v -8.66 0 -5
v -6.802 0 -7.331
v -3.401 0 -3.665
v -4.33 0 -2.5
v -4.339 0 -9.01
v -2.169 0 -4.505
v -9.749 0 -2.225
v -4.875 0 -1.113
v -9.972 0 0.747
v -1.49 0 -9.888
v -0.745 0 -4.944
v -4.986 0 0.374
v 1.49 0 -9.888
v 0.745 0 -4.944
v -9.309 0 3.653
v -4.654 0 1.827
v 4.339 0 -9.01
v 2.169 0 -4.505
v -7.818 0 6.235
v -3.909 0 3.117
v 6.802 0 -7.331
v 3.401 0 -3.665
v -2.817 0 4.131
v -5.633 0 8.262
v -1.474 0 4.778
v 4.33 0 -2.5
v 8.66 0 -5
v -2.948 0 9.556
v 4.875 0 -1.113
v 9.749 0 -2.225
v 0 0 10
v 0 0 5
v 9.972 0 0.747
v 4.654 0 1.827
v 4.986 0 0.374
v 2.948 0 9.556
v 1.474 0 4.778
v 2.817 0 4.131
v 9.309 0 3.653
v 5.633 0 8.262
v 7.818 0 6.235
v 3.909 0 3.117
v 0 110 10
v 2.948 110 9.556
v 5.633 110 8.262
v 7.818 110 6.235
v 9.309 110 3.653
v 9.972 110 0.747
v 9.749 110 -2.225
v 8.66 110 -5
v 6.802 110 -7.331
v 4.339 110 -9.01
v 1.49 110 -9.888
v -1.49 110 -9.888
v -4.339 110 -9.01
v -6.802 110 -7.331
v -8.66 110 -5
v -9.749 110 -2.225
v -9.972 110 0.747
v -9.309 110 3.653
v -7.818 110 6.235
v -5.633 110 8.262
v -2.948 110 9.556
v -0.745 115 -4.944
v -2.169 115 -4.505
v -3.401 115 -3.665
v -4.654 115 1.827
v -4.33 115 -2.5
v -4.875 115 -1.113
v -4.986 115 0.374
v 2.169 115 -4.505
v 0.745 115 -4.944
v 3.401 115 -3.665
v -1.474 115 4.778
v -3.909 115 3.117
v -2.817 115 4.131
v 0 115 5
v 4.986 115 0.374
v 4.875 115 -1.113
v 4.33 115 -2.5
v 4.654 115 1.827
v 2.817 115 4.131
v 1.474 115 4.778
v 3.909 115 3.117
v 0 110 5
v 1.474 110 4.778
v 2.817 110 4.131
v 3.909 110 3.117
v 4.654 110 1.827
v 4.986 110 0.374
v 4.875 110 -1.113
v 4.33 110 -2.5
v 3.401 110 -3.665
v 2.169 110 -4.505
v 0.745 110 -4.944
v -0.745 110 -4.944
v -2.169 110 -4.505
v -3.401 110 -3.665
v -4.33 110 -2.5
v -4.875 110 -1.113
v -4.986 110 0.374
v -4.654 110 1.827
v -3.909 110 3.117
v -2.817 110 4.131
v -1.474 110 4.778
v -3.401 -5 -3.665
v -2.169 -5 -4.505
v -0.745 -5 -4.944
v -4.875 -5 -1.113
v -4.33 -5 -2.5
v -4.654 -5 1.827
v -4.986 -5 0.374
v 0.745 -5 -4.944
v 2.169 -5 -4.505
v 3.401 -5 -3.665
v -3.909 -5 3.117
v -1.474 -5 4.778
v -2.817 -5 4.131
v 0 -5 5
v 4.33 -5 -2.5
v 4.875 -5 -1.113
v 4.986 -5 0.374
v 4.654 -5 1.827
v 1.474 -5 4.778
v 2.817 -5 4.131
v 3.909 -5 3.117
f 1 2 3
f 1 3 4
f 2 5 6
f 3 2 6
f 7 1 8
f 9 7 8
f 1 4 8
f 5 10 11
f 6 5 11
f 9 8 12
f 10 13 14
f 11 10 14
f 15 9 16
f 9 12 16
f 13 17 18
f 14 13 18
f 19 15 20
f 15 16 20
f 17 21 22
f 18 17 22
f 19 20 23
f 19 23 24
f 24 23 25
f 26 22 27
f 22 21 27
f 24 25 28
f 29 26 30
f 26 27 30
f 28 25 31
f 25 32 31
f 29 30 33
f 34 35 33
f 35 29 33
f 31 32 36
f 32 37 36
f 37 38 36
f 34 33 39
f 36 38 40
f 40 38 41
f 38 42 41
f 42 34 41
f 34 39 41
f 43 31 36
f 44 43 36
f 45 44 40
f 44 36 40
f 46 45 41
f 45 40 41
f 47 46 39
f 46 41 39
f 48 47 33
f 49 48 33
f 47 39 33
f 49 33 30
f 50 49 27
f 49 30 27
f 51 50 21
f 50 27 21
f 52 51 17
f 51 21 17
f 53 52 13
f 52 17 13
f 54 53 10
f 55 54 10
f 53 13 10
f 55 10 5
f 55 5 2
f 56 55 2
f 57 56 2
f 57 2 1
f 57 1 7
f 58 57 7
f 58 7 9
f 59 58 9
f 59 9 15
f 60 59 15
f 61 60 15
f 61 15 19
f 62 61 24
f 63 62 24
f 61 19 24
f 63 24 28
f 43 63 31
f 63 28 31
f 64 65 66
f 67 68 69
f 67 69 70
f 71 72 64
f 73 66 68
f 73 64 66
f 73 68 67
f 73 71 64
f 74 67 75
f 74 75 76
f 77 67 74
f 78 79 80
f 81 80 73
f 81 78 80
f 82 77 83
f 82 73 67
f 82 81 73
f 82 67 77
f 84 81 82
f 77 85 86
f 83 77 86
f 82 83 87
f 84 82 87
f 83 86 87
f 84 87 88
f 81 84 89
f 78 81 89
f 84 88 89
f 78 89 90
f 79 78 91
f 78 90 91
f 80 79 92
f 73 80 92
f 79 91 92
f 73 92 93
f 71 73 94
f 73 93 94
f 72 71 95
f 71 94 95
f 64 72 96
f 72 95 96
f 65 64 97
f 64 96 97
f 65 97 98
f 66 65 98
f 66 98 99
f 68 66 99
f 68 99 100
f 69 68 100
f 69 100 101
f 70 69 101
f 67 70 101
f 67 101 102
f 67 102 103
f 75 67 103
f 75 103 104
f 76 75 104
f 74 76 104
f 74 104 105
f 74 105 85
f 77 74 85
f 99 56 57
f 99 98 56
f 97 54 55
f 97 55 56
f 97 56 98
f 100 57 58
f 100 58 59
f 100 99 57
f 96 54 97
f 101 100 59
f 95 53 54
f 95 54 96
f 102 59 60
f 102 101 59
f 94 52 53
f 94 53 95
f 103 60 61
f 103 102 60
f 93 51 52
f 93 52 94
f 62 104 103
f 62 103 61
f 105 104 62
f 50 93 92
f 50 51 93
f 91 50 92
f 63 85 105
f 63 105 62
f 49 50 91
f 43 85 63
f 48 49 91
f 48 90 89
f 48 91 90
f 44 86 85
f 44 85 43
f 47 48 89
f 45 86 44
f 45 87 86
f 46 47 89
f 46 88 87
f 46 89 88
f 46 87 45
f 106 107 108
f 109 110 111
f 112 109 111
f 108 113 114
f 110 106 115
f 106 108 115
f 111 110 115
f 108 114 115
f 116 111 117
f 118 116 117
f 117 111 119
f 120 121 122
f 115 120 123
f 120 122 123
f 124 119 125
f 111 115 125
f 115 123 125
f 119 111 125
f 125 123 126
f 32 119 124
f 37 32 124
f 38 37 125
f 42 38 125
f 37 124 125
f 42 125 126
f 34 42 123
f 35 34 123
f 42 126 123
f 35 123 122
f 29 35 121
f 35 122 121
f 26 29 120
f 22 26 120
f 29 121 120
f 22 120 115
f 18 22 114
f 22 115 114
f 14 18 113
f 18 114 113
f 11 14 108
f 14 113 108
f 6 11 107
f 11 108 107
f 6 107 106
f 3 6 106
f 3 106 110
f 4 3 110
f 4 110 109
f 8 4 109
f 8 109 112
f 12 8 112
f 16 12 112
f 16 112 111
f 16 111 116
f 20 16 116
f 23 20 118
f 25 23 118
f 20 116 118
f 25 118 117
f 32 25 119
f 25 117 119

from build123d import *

# Parameters (mm, degrees)
SKETCH2_R           = 10
SKETCH2_R_2         = 5
BOSS_EXTRUDE1_DEPTH = 110
SKETCH2_2_R         = 5
BOSS_EXTRUDE2_DEPTH = 115
BOSS_EXTRUDE3_START = -5
SKETCH2_3_R         = 5
BOSS_EXTRUDE3_DEPTH = 5


with BuildPart() as part:
    # Sketch2 → Boss-Extrude1 (new body)
    with BuildSketch(Plane(origin=(0, 0, 0), x_dir=(1, 0, 0), z_dir=(0, 1, 0))):
        Circle(SKETCH2_R)
        Circle(SKETCH2_R_2, mode=Mode.SUBTRACT)
    extrude(amount=BOSS_EXTRUDE1_DEPTH)

    # Sketch2<2> → Boss-Extrude2 (add)
    with BuildSketch(Plane(origin=(0, 0, 0), x_dir=(1, 0, 0), z_dir=(0, 1, 0))):
        Circle(SKETCH2_2_R)
    extrude(amount=BOSS_EXTRUDE2_DEPTH)

    # Sketch2<3> → Boss-Extrude3 (add)
    with BuildSketch(Plane(origin=(0, 0, 0), x_dir=(1, 0, 0), z_dir=(0, 1, 0)).offset(BOSS_EXTRUDE3_START)):
        Circle(SKETCH2_3_R)
    extrude(amount=BOSS_EXTRUDE3_DEPTH)


solid = part.part
